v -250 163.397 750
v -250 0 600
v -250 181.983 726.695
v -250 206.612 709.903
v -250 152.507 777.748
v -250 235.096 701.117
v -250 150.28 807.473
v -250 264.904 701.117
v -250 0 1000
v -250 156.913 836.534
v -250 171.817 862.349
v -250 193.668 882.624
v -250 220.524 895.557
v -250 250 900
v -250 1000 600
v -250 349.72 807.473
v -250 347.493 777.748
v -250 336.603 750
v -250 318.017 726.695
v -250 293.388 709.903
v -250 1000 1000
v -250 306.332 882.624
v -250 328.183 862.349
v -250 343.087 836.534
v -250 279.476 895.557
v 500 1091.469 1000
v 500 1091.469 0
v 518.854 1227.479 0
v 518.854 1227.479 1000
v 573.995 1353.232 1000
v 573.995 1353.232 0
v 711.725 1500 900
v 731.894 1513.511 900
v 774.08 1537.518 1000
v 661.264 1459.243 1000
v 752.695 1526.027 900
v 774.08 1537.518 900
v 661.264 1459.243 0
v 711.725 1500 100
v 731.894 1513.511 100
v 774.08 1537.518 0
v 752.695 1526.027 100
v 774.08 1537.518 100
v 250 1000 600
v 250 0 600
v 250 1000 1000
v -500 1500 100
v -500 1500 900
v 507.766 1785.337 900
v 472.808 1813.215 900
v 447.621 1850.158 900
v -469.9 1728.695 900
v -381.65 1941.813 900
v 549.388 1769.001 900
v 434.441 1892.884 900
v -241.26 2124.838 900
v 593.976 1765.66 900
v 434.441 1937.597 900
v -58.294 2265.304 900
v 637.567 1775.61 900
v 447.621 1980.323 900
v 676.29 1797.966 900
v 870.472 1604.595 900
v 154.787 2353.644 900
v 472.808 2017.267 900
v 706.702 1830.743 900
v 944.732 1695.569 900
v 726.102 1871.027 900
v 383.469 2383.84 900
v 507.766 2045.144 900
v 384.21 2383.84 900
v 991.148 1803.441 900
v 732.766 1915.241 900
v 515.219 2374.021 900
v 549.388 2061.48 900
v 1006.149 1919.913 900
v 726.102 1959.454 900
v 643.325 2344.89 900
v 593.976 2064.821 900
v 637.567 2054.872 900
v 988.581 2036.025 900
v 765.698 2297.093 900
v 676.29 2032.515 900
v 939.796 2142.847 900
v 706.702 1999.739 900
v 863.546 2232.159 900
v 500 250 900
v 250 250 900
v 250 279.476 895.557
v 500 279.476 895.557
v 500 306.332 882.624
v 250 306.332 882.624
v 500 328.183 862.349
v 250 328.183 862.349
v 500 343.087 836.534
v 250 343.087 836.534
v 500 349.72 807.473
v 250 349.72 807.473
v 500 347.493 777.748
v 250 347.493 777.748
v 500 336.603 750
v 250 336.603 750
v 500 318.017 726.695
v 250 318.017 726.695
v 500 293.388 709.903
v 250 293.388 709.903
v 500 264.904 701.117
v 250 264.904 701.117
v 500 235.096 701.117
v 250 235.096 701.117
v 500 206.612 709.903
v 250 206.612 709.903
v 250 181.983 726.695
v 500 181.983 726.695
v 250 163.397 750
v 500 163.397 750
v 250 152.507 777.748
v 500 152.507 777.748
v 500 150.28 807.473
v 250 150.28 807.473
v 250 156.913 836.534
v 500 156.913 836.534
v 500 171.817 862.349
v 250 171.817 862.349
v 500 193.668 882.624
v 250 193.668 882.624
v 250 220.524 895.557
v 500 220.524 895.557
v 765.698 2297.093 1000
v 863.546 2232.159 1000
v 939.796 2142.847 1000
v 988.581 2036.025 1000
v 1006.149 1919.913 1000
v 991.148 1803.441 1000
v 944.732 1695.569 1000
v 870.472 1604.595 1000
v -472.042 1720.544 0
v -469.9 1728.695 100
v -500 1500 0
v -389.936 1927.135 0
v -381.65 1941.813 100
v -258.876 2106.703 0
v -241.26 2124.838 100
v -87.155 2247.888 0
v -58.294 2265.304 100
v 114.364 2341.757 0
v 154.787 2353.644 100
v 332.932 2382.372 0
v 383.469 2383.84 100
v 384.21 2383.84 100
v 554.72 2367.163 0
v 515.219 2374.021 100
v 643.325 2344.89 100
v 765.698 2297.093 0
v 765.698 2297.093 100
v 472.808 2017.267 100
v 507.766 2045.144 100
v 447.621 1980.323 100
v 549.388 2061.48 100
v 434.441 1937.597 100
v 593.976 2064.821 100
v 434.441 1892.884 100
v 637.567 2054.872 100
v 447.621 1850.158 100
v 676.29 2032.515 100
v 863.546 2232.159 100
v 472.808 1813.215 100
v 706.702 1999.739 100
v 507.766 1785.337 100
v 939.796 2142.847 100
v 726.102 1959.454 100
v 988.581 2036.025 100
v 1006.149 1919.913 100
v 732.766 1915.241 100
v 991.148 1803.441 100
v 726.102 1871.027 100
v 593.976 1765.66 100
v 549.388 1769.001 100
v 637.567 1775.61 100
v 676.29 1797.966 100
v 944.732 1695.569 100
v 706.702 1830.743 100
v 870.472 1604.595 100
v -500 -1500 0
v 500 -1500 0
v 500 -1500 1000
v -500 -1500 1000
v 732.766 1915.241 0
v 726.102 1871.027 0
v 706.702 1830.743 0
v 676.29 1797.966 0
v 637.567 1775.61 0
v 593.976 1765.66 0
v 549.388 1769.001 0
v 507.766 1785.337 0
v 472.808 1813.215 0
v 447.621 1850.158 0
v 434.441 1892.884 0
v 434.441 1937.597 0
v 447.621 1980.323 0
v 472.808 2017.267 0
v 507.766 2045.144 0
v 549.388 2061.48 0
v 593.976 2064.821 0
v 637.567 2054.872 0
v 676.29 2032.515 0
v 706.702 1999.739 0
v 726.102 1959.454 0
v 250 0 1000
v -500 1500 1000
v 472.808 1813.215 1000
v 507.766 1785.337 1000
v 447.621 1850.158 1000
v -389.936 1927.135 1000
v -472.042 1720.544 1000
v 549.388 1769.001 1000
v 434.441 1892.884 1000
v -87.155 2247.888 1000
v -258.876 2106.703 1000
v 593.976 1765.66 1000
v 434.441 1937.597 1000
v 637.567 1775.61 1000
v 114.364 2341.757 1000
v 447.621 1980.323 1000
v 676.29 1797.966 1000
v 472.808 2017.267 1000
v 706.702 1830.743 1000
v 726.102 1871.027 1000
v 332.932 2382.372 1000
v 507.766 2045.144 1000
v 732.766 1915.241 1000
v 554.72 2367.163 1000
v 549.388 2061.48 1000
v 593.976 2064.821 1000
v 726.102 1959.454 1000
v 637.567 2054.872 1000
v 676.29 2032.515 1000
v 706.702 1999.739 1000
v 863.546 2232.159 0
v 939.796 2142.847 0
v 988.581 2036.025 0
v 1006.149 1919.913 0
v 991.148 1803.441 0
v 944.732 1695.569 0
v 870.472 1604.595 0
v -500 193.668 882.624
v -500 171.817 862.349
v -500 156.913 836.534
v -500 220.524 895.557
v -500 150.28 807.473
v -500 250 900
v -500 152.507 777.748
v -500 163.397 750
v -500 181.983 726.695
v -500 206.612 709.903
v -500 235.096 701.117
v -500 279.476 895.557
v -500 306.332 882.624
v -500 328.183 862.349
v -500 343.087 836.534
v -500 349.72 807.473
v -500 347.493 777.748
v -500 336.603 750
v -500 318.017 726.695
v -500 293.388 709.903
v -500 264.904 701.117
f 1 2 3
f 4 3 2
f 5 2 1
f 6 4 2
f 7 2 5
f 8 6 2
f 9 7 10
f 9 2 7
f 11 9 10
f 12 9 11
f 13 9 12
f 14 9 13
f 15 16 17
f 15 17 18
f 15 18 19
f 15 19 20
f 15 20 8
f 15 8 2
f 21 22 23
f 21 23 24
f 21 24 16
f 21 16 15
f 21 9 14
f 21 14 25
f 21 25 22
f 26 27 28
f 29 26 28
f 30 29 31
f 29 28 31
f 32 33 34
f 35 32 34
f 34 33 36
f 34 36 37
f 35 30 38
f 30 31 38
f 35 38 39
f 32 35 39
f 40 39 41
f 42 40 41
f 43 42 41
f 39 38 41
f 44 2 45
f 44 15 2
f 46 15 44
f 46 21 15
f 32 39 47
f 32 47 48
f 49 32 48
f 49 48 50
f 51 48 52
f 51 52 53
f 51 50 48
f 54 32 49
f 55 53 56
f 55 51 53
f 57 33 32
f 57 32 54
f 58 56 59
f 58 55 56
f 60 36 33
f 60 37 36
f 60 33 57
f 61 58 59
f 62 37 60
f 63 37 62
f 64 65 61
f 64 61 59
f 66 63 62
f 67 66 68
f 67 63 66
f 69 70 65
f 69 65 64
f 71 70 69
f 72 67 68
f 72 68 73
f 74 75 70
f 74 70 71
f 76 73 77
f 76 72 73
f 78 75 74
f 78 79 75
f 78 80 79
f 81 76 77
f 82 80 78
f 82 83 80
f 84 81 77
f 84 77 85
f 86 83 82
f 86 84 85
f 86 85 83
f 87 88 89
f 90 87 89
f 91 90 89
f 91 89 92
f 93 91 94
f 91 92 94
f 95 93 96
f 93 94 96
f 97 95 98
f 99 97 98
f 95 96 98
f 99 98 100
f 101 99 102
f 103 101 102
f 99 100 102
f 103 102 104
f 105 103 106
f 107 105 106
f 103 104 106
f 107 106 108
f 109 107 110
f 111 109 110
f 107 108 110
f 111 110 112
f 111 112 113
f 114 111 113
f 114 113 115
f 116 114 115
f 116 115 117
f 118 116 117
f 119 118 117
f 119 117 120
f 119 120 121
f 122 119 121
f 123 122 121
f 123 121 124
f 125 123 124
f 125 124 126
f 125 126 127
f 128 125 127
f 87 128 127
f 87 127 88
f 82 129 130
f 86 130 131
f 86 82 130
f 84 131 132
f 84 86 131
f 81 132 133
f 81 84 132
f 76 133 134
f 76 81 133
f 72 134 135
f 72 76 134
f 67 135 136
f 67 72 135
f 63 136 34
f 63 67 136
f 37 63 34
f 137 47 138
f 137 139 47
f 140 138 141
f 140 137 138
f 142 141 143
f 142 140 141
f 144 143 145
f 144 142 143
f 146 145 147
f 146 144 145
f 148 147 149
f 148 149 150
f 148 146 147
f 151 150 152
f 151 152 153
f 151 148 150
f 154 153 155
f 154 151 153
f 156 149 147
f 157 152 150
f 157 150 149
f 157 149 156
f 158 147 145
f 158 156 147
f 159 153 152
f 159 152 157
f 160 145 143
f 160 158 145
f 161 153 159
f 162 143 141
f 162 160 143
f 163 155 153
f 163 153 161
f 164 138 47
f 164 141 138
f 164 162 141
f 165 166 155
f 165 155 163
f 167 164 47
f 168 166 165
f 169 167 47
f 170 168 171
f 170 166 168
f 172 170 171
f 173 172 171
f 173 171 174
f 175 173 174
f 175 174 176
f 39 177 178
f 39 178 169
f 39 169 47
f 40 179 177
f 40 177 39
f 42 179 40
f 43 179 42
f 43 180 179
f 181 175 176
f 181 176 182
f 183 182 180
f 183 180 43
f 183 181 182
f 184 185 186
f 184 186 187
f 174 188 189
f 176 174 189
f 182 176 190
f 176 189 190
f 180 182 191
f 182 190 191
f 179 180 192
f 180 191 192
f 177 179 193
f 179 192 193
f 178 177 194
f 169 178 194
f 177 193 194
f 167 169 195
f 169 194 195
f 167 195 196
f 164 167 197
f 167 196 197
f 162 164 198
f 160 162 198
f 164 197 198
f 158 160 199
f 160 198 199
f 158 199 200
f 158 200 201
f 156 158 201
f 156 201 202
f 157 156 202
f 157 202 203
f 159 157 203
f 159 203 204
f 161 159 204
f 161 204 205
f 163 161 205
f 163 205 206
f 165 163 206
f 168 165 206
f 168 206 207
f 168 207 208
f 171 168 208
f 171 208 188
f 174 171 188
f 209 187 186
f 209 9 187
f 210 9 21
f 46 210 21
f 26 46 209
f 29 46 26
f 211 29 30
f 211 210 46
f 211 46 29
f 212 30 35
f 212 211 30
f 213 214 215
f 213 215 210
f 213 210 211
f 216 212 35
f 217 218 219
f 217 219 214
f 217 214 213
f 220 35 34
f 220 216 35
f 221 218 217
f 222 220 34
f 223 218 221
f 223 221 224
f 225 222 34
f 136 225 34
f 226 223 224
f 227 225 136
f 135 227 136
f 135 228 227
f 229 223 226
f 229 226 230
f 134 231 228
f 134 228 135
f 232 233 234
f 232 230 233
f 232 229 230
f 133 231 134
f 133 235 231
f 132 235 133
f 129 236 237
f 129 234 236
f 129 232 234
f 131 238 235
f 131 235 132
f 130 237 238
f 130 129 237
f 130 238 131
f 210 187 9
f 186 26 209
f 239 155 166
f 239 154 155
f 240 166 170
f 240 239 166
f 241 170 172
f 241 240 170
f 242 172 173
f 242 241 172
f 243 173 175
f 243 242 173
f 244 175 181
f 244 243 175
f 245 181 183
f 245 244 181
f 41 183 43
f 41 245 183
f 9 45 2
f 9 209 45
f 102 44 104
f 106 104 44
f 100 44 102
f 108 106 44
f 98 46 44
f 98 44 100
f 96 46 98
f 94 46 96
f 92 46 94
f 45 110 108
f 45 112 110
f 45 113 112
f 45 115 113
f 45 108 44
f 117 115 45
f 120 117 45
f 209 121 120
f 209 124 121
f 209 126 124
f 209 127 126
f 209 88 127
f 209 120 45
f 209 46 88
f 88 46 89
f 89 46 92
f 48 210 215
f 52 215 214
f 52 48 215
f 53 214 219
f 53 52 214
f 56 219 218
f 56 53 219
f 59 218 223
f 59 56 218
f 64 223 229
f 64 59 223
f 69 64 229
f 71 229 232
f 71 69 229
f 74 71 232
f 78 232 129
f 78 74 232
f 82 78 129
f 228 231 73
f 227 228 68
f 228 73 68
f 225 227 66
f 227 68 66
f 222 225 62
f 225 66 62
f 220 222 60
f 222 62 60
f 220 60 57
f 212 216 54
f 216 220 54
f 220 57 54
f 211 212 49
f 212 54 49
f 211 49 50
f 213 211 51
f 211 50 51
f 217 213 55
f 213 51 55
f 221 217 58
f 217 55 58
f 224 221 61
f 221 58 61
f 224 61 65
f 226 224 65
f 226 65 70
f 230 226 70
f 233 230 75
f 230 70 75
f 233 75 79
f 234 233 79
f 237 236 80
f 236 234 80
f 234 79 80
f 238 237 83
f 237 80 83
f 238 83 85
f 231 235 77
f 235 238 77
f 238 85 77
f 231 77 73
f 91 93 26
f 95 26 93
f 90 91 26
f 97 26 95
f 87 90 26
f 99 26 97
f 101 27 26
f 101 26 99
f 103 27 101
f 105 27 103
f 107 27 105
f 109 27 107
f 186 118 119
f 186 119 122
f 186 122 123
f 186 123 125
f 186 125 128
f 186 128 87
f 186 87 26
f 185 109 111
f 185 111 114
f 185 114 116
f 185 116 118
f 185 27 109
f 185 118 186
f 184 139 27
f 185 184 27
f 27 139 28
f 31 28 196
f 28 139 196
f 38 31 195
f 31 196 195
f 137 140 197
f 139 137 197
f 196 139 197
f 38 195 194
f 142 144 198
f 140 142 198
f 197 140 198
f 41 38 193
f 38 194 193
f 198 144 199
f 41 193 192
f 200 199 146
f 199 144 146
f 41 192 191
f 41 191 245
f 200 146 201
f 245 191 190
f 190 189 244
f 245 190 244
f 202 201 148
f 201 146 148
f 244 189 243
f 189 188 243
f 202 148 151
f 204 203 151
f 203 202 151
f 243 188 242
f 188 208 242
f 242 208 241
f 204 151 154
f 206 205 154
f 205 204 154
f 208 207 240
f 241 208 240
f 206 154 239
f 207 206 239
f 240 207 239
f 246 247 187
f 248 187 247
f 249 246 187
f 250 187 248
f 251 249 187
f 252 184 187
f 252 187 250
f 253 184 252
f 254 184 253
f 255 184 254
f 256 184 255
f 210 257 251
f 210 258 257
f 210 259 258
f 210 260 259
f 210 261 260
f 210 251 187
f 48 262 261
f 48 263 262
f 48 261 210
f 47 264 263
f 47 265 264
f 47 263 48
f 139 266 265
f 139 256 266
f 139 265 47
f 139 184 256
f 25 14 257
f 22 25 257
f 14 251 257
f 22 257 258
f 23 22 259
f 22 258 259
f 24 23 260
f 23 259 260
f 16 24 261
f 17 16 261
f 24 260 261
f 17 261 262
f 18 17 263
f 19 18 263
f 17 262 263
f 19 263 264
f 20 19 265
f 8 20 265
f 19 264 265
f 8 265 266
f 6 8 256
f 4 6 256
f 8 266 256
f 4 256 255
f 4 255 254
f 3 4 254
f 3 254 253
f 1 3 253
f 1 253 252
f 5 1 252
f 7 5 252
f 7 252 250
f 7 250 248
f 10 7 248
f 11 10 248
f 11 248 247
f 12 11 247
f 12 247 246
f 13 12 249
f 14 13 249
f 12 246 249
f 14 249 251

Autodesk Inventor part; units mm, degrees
ref_plane "YZ Plane" through (0, 0, 0) normal (1, 0, 0) x (0, 1, 0)
ref_plane "XZ Plane" through (0, 0, 0) normal (0, 1, 0) x (-1, 0, 0)
sketch "Skizze1" plane through (0, 0, 0) normal (0, 0, 1) x (1, 0, 0)
  line L0 (-1066.0722, 0) -> (1356.4088, 0) construction
  line L1 (0, -2329.2869) -> (0, 3475.7215) construction
  line L2 (500, 1091.469) -> (500, -1500)
  line L3 (500, -1500) -> (-500, -1500)
  line L4 (-500, -1500) -> (-500, 1500)
  line L5 (-500, 1500) -> (500, -1500) construction
  line L6 (500, 1500) -> (-500, -1500) construction
  arc A0 (765.6976, 2297.0927) -> (-500, 1500) centre (383.8395, 1500) ccw
  arc A1 (774.0795, 1537.5182) -> (765.6976, 2297.0927) centre (582.7661, 1915.2406) ccw
  circle A2 centre (582.7661, 1915.2406) radius 150
  arc A3 (774.0795, 1537.5182) -> (500, 1091.469) centre (1000, 1091.469) ccw
  point P0 (0, 0)
  dimension "d0" = 1000
  dimension "d1" = 3000
  dimension "d2" = 423.4087
  dimension "d3" = 300
  dimension "d5" = 500
extrude "Extrusion1" add sketch "Skizze1" along normal blind 1000
ref_plane "Arbeitsebene1" through (0, -1500, 0) normal (-1, 0, 0) x (0, 0, 1)
sketch "Skizze2" plane through (0, -1500, 0) normal (-1, 0, 0) x (0, 0, 1)
  line L0 (0, 3000) -> (1000, 3000) projected
  line L1 (100, 3000) -> (908.6027, 3000)
  line L2 (0, 3883.8395) -> (1000, 3883.8395) construction
  line L3 (100, 3000) -> (900, 3000)
  line L4 (900, 3000) -> (900, 3883.8395)
  line L5 (900, 3883.8395) -> (100, 3883.8395)
  line L6 (100, 3883.8395) -> (100, 3000)
  line L7 (1000, 3000) -> (1000, 3883.8395) construction
  point P0 (0, 1500)
  point P1 (1000, 3797.0927)
  dimension "d8" = 800
  dimension "d9" = 100
extrude "Extrusion2" cut sketch "Skizze2" along normal mid plane 2500
sketch "Skizze3" plane through (0, 0, 1000) normal (0, 0, 1) x (1, 0, 0)
  point P0 (0, 0)
sketch "Skizze4" plane through (0, 0, 1000) normal (0, 0, 1) x (1, 0, 0)
  point P0 (0, 0)
sketch "Skizze5" plane through (0, 0, 1000) normal (0, 0, 1) x (1, 0, 0)
  line L0 (-500, 1500) -> (-500, -1500) construction
  line L1 (0, 0) -> (-250, 0)
  line L2 (-250, 0) -> (-250, 1000)
  line L3 (-250, 1000) -> (0, 1000)
  line L4 (0, 1000) -> (250, 1000)
  line L5 (250, 1000) -> (250, 0)
  line L6 (250, 0) -> (0, 0)
  line L7 (-250, 1000) -> (250, 1000)
  line L8 (250, 1000) -> (250, 0)
  line L9 (250, 0) -> (-250, 0)
  line L10 (-250, 0) -> (-250, 1000)
  dimension "d13" = 250
  dimension "d14" = 1000
  dimension "d15" = 250
extrude "Extrusion3" cut sketch "Skizze5" against normal blind 400
sketch "Skizze6" plane through (-500, -1500, 0) normal (-1, 0, 0) x (0, 0, 1)
  point P0 (0, 1500)
sketch "Skizze7" plane through (-500, -1500, 0) normal (-1, 0, 0) x (0, 0, 1)
  point P0 (0, 1500)
sketch "Skizze8" plane through (-500, -1500, 0) normal (0, -1, 0) x (1, 0, 0)
  point P0 (500, 0)
sketch "Skizze9" plane through (-500, -1500, 0) normal (-1, 0, 0) x (0, 0, 1)
  line L0 (1000, 0) -> (800, 0)
  circle A0 centre (800, 1750) radius 100
  point P0 (0, 1500)
extrude "Extrusion4" cut sketch "Skizze9" against normal through all
sketch "Skizze10" plane through (0, 0, 1000) normal (0, 0, 1) x (1, 0, 0)
  point P0 (0, 0)
properties part number "Unterstützen"
